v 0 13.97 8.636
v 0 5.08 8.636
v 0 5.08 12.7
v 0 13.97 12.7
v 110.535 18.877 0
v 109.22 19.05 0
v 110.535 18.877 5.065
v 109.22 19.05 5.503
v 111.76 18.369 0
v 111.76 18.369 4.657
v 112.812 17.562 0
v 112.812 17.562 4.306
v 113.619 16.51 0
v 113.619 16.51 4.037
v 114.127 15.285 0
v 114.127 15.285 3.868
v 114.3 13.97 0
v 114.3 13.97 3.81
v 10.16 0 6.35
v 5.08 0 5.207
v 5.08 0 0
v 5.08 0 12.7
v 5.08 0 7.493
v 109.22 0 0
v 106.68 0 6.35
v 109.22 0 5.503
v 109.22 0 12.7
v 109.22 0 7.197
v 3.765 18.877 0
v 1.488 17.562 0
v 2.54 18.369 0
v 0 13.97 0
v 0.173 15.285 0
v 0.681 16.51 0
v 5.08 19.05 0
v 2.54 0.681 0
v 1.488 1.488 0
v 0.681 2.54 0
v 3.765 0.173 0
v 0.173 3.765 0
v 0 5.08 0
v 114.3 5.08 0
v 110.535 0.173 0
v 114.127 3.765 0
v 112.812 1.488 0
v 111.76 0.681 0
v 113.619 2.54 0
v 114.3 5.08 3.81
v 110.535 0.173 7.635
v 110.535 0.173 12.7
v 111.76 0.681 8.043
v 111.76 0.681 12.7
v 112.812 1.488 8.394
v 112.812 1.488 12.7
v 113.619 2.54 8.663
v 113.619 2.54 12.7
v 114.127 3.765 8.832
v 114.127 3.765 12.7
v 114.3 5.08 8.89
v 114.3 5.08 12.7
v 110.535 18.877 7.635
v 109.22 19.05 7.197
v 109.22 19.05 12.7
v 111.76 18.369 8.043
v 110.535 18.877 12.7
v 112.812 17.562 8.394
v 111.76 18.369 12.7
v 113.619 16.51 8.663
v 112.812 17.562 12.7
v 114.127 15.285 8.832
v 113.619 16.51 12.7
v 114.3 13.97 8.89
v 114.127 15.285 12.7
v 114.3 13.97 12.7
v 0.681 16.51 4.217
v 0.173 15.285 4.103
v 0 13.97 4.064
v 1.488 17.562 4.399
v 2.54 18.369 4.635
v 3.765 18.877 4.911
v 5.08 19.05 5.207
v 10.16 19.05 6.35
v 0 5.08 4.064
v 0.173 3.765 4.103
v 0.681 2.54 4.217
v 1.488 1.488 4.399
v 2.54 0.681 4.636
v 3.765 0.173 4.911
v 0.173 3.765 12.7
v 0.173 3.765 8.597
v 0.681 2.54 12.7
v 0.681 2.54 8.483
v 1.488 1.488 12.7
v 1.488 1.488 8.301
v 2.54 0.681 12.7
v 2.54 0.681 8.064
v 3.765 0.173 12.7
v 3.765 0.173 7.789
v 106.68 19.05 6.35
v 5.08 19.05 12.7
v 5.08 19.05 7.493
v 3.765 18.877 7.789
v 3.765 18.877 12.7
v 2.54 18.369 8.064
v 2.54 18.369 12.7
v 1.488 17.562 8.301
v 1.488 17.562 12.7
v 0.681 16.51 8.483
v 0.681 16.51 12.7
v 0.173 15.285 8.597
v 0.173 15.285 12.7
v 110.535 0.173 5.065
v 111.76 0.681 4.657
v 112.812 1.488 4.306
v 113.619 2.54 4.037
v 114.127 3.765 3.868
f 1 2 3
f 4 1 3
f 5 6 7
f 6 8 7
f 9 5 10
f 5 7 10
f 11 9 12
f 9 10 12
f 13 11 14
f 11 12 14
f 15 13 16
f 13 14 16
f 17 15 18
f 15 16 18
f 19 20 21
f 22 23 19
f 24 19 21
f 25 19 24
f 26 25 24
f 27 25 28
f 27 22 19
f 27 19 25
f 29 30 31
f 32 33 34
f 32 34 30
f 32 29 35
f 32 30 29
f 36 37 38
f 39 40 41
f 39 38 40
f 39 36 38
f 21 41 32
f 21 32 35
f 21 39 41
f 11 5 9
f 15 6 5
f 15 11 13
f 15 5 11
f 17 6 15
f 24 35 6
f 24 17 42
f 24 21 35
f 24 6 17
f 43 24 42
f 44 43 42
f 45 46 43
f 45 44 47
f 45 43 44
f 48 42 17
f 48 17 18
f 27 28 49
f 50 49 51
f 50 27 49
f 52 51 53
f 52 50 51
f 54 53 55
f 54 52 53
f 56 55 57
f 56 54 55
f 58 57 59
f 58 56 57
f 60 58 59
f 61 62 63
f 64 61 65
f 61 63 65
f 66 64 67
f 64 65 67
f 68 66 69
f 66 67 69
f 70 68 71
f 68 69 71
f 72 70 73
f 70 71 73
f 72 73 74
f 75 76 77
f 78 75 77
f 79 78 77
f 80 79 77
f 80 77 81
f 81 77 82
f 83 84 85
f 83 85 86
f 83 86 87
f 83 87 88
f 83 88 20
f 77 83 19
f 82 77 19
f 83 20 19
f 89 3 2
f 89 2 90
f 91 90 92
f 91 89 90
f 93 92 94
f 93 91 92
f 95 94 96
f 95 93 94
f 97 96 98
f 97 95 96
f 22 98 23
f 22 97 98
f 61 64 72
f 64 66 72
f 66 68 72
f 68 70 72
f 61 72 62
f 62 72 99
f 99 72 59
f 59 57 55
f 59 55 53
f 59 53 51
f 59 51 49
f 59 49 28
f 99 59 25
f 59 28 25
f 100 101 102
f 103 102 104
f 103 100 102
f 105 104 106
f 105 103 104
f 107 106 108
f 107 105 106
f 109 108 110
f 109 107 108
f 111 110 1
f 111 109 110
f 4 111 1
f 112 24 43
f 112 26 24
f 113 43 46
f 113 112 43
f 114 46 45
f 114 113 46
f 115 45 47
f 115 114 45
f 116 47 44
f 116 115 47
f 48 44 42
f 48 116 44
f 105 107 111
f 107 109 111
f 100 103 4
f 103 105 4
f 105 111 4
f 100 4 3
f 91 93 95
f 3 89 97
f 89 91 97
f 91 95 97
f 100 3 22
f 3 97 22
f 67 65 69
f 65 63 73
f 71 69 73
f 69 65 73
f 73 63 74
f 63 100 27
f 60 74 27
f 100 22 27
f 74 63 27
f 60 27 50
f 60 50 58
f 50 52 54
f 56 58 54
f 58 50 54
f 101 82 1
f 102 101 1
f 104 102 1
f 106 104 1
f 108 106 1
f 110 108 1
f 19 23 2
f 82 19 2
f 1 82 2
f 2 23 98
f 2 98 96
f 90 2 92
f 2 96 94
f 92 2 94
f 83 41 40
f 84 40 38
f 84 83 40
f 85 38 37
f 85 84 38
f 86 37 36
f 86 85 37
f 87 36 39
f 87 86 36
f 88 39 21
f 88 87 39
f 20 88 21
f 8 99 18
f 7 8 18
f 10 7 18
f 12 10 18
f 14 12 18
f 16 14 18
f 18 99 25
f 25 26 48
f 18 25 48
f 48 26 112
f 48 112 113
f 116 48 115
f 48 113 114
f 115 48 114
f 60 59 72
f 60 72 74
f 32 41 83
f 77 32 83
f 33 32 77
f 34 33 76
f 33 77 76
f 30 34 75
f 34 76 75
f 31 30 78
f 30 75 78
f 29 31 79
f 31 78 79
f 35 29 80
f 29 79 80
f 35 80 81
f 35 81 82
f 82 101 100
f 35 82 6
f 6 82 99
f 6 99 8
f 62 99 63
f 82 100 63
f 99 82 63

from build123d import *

# Parameters (mm, degrees)
F0_W     = 114.3
F0_H     = 12.7
F1_DEPTH = 19.05
F3_R     = 5.08
F4_DEPTH = 19.05
F5_R     = 5.08
F7_DEPTH = 25.4
F8_R     = 5.08


with BuildPart() as f1:
    # F0 (on Front) → F1 (new body)
    with BuildSketch(Plane.XZ):
        with Locations((57.15, 6.35)):
            Rectangle(F0_W, F0_H)
    extrude(amount=-F1_DEPTH)

    # F3
    f3_edges = [f1.edges().sort_by_distance(p)[0] for p in [
        (0, 0, 6.35),
    ]]
    fillet(f3_edges, radius=F3_R)

    # F2 (on face) → F4 (cut)
    with BuildSketch(Plane.XZ):
        Polygon((10.16, 6.35), (0, 8.636), (0, 4.064), align=None)
    extrude(amount=-F4_DEPTH, mode=Mode.SUBTRACT)

    # F5
    f5_edges = [f1.edges().sort_by_distance(p)[0] for p in [
        (0, 19.05, 10.668),
        (0, 19.05, 2.032),
    ]]
    fillet(f5_edges, radius=F5_R)

    # F6 (on face) → F7 (cut)
    with BuildSketch(Plane.XZ):
        Polygon((114.3, 3.81), (114.3, 8.89), (106.68, 6.35), align=None)
    extrude(amount=-F7_DEPTH, mode=Mode.SUBTRACT)

    # F8
    f8_edges = [f1.edges().sort_by_distance(p)[0] for p in [
        (114.3, 0, 10.795),
        (114.3, 0, 1.905),
        (114.3, 19.05, 10.795),
        (114.3, 19.05, 1.905),
    ]]
    fillet(f8_edges, radius=F8_R)


solid = f1.part
